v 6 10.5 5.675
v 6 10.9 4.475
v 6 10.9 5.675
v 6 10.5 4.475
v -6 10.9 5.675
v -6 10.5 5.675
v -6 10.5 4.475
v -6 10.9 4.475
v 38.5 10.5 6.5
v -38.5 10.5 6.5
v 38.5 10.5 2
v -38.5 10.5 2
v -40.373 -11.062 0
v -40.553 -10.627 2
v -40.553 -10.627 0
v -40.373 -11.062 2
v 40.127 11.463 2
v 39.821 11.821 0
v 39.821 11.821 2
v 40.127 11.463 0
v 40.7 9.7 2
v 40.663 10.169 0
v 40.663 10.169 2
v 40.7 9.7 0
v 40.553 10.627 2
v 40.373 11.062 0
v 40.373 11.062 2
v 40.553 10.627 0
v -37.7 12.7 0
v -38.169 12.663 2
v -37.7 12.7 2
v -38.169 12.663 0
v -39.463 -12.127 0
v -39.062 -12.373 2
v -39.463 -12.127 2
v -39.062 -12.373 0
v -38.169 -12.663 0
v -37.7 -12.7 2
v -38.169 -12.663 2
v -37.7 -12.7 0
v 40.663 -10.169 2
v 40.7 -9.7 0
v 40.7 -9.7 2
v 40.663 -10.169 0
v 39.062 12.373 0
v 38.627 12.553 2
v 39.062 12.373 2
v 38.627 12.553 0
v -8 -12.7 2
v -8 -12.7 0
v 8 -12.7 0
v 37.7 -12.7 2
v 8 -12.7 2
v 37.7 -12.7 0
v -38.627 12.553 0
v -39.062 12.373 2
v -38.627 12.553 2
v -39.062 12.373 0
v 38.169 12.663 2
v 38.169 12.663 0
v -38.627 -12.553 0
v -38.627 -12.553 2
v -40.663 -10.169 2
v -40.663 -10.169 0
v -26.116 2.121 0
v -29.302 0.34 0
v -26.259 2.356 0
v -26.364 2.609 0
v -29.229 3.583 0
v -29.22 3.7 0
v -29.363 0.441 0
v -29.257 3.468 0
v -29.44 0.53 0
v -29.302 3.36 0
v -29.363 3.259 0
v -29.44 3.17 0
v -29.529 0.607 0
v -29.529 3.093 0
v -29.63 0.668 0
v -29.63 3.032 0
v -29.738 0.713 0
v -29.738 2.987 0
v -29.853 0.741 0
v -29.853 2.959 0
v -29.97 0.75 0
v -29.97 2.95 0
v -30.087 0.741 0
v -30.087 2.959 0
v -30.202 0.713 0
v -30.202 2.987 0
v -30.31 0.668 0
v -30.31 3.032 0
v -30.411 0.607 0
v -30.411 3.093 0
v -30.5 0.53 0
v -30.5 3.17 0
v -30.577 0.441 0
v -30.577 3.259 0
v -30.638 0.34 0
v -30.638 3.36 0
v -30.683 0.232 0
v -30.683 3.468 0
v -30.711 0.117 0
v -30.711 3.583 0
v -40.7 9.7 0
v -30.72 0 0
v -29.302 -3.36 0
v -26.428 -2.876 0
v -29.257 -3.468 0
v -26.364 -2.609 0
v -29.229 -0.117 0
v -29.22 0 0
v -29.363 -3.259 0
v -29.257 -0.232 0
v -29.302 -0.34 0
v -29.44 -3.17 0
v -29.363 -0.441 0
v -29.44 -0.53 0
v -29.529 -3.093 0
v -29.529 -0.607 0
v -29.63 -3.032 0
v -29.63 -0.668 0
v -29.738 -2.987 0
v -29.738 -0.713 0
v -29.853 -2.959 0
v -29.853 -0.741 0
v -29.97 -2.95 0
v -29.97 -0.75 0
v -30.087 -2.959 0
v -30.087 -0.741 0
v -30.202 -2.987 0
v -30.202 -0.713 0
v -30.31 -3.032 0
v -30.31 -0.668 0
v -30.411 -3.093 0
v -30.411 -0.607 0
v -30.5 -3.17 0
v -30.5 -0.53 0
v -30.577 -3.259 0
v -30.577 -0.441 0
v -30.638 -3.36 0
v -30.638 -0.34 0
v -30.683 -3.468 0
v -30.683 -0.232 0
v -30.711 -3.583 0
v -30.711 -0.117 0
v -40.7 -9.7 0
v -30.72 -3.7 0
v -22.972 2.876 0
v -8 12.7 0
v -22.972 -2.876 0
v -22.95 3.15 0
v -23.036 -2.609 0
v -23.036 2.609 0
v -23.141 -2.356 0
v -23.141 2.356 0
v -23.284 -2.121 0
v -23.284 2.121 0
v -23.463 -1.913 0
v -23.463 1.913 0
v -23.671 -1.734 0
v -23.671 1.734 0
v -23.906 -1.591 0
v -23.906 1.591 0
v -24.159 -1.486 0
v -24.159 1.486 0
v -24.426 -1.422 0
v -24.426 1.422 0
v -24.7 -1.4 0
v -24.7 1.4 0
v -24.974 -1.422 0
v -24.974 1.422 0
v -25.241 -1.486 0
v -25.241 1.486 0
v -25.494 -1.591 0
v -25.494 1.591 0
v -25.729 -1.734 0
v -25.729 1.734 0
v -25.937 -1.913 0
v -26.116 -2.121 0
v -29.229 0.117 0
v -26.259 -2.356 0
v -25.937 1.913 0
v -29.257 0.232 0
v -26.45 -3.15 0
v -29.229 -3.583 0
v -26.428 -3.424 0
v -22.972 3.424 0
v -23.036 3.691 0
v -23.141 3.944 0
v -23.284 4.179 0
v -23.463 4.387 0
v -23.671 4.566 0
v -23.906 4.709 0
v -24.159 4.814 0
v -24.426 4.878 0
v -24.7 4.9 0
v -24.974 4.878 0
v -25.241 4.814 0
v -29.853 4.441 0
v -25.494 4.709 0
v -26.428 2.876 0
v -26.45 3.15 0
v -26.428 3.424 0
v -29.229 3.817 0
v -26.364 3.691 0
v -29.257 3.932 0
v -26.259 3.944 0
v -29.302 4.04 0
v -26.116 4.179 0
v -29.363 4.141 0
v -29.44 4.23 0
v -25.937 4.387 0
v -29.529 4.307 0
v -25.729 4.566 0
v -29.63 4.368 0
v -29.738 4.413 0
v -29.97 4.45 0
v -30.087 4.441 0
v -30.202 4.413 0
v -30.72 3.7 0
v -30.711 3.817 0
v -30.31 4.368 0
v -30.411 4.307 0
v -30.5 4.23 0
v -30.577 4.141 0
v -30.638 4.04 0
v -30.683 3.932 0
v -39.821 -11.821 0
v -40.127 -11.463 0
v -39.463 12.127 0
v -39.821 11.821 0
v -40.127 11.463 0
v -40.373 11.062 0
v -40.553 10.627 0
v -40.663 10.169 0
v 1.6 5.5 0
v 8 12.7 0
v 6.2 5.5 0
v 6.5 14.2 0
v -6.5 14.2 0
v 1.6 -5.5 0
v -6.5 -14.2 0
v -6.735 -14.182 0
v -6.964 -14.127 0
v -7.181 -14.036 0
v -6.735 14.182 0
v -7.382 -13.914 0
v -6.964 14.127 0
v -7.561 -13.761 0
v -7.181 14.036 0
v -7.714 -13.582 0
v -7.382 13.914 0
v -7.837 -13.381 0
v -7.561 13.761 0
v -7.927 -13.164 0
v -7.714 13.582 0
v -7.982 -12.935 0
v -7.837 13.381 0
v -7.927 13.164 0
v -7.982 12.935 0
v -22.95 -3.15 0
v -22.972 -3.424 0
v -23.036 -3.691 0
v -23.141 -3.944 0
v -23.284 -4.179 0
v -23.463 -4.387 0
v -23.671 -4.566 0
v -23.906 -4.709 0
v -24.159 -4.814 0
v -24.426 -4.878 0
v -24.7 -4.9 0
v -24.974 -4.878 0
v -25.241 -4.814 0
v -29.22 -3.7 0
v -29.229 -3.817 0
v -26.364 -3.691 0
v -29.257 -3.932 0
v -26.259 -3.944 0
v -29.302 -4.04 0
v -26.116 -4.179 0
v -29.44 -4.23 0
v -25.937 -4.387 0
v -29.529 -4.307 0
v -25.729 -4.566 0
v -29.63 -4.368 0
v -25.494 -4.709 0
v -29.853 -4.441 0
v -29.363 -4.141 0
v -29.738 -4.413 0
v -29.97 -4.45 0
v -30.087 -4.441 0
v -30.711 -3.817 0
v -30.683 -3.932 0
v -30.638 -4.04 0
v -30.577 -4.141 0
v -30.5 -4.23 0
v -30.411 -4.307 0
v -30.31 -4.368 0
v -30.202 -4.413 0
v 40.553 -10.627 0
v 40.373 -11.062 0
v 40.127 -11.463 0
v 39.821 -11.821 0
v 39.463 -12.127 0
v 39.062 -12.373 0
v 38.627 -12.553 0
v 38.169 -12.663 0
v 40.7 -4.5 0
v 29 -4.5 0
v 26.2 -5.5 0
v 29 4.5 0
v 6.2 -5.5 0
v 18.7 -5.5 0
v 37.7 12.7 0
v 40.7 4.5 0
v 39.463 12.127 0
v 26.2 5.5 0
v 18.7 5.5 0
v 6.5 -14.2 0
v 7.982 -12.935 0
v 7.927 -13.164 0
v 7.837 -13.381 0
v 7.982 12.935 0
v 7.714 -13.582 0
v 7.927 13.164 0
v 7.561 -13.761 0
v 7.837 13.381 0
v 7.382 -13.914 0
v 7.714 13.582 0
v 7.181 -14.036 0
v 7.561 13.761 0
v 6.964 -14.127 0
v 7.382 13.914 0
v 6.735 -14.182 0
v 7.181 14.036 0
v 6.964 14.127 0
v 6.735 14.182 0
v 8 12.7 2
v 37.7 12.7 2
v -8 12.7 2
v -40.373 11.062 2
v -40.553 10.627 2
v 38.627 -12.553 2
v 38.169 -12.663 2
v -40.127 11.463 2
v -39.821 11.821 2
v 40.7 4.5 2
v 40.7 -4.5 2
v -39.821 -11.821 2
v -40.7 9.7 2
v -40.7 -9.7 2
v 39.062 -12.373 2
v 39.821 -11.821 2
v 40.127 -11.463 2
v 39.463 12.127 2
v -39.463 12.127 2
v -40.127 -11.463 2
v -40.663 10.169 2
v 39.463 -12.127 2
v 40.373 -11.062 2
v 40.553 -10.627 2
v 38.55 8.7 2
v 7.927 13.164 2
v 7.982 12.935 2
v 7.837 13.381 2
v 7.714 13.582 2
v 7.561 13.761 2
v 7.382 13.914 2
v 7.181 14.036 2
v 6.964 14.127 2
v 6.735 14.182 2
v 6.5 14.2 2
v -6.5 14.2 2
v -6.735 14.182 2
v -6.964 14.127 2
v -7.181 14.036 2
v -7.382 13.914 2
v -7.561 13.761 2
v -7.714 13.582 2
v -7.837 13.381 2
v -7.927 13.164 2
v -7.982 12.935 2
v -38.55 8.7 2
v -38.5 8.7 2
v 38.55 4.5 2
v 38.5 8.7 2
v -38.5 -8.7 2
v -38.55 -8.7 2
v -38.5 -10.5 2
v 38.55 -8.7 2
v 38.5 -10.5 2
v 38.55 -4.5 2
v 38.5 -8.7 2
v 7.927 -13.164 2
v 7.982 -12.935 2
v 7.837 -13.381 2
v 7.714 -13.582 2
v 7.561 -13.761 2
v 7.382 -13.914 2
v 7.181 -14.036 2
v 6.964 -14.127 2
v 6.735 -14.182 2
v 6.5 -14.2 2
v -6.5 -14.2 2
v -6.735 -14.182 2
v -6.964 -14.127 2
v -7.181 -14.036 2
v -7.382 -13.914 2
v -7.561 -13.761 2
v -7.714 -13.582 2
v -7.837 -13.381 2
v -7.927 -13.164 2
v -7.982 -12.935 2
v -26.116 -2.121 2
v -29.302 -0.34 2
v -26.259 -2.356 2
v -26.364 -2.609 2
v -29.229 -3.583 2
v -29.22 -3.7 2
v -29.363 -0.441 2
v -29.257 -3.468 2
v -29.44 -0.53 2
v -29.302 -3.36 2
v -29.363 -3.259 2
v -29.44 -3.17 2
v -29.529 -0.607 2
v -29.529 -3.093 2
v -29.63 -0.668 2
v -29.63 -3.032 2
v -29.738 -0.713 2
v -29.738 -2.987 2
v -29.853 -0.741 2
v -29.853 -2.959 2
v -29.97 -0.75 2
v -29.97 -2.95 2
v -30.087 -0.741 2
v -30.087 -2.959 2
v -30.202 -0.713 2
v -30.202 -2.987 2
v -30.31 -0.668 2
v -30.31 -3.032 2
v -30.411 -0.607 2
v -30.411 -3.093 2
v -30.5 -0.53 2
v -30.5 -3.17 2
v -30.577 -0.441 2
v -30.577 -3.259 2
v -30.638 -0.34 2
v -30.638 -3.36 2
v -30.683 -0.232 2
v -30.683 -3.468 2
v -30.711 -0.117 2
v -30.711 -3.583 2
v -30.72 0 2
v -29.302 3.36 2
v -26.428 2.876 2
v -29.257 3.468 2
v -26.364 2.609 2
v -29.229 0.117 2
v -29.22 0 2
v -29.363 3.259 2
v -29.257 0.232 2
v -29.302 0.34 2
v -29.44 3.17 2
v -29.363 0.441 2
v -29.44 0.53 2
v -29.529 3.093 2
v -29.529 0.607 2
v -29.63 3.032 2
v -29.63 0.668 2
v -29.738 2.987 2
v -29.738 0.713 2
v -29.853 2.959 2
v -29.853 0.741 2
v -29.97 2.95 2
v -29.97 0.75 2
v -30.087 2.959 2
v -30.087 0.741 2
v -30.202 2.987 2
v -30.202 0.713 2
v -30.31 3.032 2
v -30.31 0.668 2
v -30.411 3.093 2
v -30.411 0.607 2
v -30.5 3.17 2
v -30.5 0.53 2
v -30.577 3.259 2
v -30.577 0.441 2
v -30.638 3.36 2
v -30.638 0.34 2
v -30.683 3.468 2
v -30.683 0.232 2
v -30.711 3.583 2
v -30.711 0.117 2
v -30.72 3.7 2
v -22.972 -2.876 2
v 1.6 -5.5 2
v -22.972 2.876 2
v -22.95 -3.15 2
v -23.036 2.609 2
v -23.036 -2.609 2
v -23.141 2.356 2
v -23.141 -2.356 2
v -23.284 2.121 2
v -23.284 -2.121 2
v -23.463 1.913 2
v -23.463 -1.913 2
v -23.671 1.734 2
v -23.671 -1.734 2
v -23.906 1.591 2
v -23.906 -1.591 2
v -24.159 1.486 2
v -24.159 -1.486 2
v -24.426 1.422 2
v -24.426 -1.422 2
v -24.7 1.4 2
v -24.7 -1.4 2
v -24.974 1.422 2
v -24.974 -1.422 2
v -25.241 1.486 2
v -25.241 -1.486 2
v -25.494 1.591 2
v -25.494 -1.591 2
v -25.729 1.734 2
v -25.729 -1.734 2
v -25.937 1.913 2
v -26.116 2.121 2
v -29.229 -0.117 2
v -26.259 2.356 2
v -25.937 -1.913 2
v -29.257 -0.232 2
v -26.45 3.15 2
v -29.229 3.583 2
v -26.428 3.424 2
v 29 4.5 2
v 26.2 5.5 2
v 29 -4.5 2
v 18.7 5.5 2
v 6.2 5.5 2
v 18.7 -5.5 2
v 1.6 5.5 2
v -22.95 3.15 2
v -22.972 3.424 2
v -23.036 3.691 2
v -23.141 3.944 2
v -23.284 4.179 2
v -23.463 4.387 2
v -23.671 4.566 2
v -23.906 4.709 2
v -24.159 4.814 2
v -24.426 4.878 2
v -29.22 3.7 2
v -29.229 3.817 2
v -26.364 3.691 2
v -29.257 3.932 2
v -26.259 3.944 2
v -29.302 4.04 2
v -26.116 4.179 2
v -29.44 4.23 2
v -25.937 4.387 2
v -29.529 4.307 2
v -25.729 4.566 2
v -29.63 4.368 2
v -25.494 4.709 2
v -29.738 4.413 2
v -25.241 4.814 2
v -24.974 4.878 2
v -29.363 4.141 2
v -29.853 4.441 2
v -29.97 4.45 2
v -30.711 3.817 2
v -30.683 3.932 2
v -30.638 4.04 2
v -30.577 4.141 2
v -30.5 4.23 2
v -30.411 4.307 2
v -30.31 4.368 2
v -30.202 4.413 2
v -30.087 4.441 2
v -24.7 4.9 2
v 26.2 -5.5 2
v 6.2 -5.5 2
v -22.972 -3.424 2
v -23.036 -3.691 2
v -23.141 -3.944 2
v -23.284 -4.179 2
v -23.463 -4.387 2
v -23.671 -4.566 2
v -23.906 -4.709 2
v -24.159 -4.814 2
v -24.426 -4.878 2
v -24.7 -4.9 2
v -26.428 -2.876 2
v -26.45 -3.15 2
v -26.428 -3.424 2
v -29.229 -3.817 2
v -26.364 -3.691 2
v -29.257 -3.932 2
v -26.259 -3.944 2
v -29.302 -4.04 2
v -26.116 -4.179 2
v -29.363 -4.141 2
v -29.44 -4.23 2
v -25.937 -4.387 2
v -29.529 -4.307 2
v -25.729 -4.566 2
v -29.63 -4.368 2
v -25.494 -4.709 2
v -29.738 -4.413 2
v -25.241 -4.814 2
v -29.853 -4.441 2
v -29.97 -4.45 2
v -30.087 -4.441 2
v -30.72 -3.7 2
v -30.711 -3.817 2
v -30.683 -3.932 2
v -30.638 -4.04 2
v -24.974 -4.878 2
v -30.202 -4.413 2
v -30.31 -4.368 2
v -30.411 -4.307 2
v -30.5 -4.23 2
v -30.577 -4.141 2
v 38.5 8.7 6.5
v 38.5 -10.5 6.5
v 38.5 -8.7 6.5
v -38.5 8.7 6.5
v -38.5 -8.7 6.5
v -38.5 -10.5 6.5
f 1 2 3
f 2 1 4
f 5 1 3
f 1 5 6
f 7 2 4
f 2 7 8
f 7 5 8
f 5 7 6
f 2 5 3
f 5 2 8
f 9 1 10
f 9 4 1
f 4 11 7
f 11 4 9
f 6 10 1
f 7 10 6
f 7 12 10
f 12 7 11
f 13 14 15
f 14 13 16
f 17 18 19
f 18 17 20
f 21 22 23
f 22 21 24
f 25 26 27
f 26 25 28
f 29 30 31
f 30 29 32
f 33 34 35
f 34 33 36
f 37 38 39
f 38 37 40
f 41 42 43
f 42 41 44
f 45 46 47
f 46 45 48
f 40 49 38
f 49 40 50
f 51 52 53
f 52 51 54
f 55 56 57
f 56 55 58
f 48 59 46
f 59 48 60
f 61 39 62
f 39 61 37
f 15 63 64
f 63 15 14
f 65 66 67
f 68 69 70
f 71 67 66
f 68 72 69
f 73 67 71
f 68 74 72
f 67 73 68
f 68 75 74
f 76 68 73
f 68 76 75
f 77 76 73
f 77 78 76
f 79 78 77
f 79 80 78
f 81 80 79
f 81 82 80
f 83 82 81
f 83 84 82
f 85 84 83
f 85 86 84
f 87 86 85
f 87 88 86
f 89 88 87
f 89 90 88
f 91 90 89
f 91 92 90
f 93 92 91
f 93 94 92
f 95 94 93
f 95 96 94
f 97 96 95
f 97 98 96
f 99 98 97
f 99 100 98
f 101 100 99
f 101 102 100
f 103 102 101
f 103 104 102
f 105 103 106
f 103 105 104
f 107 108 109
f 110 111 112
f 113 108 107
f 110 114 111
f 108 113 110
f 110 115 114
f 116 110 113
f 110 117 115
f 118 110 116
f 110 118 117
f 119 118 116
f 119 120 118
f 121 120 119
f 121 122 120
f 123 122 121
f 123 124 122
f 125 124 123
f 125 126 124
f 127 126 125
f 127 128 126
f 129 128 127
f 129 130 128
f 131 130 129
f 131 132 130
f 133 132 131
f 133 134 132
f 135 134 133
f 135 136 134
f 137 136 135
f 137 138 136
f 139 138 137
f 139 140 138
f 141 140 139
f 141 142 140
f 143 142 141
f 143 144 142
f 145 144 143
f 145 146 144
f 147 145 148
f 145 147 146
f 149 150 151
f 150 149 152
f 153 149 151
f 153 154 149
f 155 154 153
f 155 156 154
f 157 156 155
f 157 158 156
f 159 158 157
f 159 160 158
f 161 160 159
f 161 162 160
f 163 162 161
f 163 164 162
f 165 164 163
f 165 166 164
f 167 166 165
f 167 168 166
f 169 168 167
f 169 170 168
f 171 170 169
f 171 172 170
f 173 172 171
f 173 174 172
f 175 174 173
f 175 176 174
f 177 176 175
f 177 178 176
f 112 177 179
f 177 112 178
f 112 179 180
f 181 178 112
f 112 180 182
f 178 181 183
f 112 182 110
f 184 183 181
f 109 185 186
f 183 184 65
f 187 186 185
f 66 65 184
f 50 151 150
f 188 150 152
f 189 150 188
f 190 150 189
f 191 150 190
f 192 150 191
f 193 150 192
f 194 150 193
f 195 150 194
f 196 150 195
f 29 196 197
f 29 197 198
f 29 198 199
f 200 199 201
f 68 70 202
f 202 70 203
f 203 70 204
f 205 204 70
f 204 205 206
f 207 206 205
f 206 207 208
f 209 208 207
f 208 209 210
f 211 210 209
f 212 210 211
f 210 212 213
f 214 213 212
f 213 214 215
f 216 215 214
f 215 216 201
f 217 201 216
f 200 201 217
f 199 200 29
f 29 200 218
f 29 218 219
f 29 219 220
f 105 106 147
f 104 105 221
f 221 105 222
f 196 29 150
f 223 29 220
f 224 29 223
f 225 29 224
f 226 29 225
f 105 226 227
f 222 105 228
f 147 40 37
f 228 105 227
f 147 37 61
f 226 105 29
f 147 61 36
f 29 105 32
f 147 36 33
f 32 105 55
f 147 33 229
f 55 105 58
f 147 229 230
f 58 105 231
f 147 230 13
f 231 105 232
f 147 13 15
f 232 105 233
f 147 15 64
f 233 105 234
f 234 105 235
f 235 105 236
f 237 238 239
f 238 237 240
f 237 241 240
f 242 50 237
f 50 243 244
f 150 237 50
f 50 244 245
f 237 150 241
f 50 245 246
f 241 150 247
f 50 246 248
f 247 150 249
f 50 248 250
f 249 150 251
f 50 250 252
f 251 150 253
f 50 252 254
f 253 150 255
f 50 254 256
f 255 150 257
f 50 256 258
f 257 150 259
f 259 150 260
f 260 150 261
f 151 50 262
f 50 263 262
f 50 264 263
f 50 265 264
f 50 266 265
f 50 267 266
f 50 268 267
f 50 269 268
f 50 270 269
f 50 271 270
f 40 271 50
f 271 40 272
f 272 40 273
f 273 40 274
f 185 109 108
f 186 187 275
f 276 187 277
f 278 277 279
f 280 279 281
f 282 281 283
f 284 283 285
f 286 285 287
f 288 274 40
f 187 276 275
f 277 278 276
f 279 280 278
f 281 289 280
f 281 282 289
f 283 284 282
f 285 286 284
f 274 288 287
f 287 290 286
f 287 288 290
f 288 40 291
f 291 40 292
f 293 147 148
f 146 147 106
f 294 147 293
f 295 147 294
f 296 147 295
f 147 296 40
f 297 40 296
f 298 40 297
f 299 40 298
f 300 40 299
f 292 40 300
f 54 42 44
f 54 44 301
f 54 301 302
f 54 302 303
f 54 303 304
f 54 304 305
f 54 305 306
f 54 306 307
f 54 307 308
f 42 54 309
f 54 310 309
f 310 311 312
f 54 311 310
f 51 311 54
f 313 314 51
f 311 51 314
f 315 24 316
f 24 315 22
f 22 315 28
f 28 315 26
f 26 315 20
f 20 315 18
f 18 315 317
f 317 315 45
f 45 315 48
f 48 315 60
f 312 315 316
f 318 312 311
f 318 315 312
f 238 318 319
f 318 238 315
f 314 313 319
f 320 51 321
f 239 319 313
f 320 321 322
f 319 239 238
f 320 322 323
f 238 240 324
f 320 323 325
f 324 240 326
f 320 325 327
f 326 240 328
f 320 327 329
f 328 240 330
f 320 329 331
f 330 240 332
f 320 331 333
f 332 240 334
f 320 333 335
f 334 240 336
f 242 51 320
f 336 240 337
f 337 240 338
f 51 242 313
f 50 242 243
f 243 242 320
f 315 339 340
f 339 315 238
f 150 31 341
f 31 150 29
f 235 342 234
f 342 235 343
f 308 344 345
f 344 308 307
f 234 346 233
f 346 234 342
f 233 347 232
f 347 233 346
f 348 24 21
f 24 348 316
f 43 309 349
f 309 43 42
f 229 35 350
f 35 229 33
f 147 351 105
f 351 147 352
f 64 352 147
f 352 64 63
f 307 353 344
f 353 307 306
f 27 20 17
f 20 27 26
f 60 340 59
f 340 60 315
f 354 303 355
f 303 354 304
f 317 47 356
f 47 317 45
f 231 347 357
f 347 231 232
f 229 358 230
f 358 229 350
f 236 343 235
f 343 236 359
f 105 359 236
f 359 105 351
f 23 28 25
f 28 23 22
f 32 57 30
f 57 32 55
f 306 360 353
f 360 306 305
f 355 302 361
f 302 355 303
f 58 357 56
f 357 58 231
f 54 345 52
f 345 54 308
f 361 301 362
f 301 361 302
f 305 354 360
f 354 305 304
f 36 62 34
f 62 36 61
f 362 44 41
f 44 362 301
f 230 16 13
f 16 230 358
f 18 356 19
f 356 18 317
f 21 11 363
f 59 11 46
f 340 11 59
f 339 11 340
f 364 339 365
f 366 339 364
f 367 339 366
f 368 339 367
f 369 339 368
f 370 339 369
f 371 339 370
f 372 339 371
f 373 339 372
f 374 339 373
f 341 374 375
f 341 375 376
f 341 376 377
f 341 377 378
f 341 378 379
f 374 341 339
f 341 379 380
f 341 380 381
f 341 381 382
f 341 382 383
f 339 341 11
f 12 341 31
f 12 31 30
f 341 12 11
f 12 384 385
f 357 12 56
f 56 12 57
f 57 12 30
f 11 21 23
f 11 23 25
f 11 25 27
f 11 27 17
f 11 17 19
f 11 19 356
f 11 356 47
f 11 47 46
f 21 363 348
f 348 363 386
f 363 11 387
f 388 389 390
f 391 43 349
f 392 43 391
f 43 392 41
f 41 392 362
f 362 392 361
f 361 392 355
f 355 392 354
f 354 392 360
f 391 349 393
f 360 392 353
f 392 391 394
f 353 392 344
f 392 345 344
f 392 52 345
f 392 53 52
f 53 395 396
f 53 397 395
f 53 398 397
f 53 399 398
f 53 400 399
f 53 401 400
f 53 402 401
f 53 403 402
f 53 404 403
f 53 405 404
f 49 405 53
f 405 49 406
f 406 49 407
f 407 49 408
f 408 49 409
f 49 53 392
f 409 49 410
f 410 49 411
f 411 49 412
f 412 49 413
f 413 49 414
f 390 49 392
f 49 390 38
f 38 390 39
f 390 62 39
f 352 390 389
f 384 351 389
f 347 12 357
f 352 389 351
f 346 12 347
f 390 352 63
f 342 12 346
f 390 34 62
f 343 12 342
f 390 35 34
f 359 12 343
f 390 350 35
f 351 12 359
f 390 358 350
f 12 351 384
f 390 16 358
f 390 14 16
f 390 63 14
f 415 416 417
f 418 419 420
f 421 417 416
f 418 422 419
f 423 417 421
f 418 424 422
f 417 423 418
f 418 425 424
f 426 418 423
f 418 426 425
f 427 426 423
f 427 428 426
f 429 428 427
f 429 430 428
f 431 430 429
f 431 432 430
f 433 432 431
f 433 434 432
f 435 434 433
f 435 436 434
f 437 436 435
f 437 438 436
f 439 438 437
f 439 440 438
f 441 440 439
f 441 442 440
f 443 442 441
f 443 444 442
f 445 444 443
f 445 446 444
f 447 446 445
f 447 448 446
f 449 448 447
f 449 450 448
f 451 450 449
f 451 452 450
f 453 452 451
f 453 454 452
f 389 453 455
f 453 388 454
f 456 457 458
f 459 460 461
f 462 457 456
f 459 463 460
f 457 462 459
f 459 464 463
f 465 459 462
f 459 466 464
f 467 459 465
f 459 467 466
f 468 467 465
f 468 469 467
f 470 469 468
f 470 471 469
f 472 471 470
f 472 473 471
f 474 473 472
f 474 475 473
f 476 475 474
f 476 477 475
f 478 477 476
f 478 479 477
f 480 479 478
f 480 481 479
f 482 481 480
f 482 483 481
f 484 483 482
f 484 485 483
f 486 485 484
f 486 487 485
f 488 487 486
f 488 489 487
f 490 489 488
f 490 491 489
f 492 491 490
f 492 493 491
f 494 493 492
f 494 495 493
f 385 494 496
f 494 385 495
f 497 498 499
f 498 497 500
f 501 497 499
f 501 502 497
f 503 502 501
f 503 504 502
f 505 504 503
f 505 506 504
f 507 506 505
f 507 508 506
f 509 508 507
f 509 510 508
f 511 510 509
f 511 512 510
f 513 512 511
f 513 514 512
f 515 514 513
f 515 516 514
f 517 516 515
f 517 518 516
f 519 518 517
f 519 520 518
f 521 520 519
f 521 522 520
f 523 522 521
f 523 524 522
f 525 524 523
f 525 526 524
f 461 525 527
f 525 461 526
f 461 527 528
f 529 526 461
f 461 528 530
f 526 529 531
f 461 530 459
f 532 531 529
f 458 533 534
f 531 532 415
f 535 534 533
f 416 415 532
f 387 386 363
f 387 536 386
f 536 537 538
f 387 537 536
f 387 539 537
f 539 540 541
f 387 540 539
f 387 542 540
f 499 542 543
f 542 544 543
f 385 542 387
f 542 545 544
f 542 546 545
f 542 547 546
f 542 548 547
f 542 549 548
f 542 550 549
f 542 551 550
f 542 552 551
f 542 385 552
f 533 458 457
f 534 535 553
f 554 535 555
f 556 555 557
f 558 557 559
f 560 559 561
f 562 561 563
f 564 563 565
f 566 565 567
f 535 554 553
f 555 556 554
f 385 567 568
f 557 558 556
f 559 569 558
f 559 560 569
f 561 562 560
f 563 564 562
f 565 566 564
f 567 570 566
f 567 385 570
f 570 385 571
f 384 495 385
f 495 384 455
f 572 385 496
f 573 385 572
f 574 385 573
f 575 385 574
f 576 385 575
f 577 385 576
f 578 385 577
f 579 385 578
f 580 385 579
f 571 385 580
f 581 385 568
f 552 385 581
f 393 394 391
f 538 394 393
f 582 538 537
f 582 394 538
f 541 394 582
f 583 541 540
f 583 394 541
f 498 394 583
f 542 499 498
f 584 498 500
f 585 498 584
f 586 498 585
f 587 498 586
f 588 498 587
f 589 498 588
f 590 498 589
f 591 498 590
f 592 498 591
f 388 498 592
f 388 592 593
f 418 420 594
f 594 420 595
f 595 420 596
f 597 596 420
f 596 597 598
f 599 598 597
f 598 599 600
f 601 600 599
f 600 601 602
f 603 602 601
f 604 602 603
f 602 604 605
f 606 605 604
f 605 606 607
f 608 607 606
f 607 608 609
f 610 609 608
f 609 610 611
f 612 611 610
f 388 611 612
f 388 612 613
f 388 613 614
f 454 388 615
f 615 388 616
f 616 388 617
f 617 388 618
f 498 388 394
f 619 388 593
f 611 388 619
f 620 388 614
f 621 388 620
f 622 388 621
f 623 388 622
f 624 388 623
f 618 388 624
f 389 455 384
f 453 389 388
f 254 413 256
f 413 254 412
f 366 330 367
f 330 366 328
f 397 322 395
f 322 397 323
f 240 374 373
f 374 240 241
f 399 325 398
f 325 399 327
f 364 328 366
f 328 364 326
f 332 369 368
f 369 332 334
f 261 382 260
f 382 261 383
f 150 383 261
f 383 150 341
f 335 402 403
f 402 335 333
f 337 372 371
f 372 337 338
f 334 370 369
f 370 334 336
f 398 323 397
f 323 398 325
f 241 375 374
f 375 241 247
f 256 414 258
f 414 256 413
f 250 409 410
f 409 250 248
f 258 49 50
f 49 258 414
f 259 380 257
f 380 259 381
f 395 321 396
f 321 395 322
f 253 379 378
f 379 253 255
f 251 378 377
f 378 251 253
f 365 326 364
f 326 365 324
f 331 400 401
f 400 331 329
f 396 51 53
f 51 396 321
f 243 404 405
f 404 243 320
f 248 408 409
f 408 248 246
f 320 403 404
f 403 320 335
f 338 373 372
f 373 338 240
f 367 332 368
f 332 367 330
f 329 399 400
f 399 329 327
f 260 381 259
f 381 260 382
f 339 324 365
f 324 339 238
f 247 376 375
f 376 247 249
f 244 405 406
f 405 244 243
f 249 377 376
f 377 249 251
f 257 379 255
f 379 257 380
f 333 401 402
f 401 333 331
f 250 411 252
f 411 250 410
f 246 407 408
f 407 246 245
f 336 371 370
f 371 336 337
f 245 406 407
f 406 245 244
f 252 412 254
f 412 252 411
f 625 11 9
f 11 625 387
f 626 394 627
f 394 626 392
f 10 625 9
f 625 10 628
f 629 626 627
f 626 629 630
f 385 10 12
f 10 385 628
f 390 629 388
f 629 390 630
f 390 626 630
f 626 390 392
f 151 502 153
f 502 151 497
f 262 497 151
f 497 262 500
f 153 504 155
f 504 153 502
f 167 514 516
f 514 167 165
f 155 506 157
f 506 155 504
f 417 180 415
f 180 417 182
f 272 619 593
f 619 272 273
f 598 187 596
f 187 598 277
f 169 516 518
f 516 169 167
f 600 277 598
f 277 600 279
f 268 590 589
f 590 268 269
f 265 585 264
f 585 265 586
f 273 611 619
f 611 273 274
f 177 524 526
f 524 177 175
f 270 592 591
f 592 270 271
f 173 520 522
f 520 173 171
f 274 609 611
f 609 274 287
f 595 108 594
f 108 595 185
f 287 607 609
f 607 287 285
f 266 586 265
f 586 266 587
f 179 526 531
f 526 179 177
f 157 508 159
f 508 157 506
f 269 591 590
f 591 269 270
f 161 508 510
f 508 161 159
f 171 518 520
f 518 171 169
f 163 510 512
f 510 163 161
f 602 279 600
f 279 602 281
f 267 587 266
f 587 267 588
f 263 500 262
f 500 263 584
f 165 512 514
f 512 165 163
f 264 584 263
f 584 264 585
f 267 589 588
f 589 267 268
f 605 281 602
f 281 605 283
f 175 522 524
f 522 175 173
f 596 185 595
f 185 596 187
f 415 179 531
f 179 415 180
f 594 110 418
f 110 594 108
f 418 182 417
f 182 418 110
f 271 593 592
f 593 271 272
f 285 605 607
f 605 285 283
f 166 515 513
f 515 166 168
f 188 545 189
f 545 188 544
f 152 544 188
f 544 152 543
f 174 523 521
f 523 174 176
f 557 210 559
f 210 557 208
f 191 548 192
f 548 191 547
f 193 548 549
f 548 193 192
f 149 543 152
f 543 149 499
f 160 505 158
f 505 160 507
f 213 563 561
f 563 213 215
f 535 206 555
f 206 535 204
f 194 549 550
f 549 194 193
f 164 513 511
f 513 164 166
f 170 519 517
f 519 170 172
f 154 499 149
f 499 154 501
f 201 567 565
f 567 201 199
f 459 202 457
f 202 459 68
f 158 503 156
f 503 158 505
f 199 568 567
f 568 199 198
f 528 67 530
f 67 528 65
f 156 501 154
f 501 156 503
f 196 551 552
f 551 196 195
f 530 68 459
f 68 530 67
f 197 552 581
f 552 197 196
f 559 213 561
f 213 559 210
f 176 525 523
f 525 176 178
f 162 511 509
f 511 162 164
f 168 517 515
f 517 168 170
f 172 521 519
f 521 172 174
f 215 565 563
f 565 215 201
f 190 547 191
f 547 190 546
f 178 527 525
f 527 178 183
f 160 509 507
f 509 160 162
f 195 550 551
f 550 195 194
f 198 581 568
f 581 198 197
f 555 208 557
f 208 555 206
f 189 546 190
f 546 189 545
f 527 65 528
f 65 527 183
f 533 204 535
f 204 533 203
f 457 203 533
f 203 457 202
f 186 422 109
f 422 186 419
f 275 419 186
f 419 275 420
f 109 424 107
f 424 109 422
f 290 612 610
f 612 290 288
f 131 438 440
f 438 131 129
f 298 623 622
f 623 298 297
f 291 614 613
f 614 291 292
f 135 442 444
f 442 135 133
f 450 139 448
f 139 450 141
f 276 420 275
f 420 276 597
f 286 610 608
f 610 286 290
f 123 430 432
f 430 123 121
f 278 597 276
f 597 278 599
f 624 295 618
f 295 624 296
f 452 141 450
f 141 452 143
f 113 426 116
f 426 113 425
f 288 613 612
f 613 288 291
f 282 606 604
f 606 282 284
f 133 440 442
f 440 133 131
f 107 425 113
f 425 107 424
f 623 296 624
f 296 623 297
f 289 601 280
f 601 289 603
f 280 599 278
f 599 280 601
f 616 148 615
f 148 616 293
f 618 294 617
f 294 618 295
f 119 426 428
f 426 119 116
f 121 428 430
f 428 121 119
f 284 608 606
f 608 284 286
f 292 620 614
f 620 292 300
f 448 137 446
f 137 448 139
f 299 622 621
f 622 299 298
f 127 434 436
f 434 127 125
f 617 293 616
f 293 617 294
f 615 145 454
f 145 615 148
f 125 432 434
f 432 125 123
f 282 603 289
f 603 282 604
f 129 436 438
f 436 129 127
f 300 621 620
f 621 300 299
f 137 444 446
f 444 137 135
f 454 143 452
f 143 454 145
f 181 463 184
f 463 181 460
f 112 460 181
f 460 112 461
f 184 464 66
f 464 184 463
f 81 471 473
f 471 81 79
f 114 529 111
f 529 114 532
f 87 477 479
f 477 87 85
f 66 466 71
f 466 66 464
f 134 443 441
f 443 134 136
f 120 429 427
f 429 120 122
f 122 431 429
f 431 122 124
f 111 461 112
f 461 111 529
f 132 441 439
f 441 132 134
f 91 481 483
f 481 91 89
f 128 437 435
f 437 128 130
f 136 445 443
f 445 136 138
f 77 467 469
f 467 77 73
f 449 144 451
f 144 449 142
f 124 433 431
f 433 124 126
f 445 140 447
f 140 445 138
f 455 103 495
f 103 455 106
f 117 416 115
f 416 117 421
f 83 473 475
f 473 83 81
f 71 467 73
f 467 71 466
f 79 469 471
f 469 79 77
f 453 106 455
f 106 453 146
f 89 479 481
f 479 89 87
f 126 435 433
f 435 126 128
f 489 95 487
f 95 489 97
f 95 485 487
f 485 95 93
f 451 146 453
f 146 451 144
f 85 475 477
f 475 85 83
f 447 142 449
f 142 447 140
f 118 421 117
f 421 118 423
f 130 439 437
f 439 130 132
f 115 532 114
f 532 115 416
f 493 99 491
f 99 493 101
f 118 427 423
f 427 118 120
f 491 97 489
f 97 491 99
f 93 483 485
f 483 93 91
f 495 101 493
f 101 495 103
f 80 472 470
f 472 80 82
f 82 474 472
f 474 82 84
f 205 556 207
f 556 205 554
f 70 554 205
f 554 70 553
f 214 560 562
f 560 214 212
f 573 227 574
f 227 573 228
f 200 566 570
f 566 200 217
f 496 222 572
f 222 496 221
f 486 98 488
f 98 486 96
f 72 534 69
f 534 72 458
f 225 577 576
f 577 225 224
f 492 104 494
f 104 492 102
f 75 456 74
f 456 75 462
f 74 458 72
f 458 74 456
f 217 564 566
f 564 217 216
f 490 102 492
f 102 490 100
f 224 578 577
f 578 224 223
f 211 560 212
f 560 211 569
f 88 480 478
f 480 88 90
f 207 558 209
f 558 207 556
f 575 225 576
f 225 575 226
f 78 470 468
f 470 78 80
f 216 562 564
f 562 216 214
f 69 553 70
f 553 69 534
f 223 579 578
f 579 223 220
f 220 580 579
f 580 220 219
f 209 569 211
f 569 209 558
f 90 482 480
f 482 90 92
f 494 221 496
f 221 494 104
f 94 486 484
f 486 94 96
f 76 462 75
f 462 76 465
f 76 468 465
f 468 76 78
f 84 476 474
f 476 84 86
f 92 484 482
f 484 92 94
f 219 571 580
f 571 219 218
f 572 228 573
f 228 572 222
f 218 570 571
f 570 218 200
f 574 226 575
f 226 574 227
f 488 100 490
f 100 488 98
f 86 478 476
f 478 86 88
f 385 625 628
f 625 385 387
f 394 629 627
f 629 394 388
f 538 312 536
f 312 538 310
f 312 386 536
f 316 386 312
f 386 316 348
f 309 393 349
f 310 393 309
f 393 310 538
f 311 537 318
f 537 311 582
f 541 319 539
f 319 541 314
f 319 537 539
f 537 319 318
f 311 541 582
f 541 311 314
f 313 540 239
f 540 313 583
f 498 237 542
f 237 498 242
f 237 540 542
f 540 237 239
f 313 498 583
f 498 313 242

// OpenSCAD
// =====================================================================
// Pimoroni Pico Plus 2 W XL - Snap-In Lid with Modular Cutouts
// Features: QW/ST+DEBUG, SP/CE, BOOT/PWR buttons, and 3 Status LEDs
// =====================================================================

$fn = 40;

// =====================================================================
// --- USER TWEAK CONSTANTS: CONNECTOR & BUTTON PUNCHES ---
// =====================================================================

// --- 1. Boot & Power/Reset Button Holes (Referenced from USB-C End) ---
btn_enable          = true;    // Set to false to disable both button holes
btn_dist_from_usbc  = 14.0;    // [FIXED] Caliper-locked distance from USB-C PCB edge inward along X
btn_spacing_y       = 6.3;     // Centre-to-centre distance between the two buttons across Y
btn_radius          = 1.75;    // Radius of button access holes (3.5 mm diameter)

// --- 2. QW/ST + DEBUG Combined Punch (From JST End) ---
qwst_debug_enable   = true;
qwst_debug_dist     = 12.5;    // X start (13.0 mm - 0.5 mm clearance)
qwst_debug_len      = 7.5;     // X length (covers 13.0 to 19.5 mm + clearance)
qwst_debug_wid      = 11.0;    // Y width (10.03 mm body + ~1.0 mm clearance)
qwst_debug_offset_y = 0.0;     // Centered on board midline

// --- 3. SP/CE Connector Punch (From JST End) ---
spce_enable         = true;
spce_dist           = 32.5;    // X start (33.0 mm - 0.5 mm clearance)
spce_len            = 4.6;     // X length (covers 33.00 to 36.57 mm + clearance)
spce_wid            = 11.0;    // Y width (10.03 mm body + ~1.0 mm clearance)
spce_offset_y       = 0.0;     // Centered on board midline

// --- 4. [NEW INCLUSION] 3x Status LED Light Holes (Referenced from USB-C End) ---
led_enable          = true;    // Set to false to disable LED holes
led_dist_from_usbc  = 8.73;    // Distance from USB-C PCB edge inward along X
led_pitch_y         = 3.70;    // Pitch between adjacent LED centres across Y (total span 7.4 mm)
led_radius          = 0.75;    // Radius of LED light holes (1.5 mm diameter)


// =====================================================================
// --- BASE & ENCLOSURE GEOMETRY (Matching Case) ---
// =====================================================================
pcb_len        = 77.0;
pcb_wid        = 21.0;
pcb_thick      = 1.45;
pcb_clearance  = 0.40;   // Cavity: 77.4 x 21.4 mm
wall_thick     = 2.0;
outer_radius   = 3.0;
board_headroom = 4.5;    // Inside depth from case rim down to PCB surface

// --- Lid & Snap Parameters ---
lid_top_thick  = 2.0;    // Thickness of outer top plate
lid_play       = 0.20;   // Sliding clearance per side
clamp_rail_w   = 1.80;   // Down-pressure rail over PCB edges

snap_bead_h    = 0.40;   // Snap bead protrusion
snap_bead_len  = 12.0;   // Snap bead length

pry_overhang   = 1.50;   // Fingernail tab overhang past outer wall
pry_tab_len    = 16.0;   // Fingernail tab length along X

jst_window_w   = 9.0;    // JST-PH connector cutout width (Y)
jst_window_l   = 9.5;    // JST-PH connector cutout length (X)
usbc_hood_drop = 1.0;    // USB-C collar drop clearance

// --- Derived Coordinates ---
cavity_x   = pcb_len + pcb_clearance;
cavity_y   = pcb_wid + pcb_clearance;
outer_x    = cavity_x + (2 * wall_thick);
outer_y    = cavity_y + (2 * wall_thick);

plug_x     = cavity_x - (2 * lid_play);
plug_y     = cavity_y - (2 * lid_play);

// Physical reference edges of the PCB inside the cavity
pcb_jst_edge_x  =  cavity_x / 2; // +X end
pcb_usbc_edge_x = -cavity_x / 2; // -X end

// --- Helper: 2D Rounded Rectangle ---
module rounded_rect(w, l, r) {
    hull() {
        for (dx = [-w/2 + r, w/2 - r]) {
            for (dy = [-l/2 + r, l/2 - r]) {
                translate([dx, dy]) circle(r = r);
            }
        }
    }
}

// =====================================================================
// --- MODULAR CUTOUT ROUTINES ---
// =====================================================================

// Generic rectangular punch measured from JST edge inward (-X)
module punch_window_from_jst(from_jst_edge, length_x, width_y, offset_y) {
    punch_center_x = pcb_jst_edge_x - from_jst_edge - (length_x / 2);
    translate([punch_center_x, offset_y, -1.0]) {
        cube([length_x, width_y, lid_top_thick + board_headroom + 2.0], center = true);
    }
}

module punch_qwst_debug() {
    if (qwst_debug_enable) {
        punch_window_from_jst(qwst_debug_dist, qwst_debug_len, qwst_debug_wid, qwst_debug_offset_y);
    }
}

module punch_spce() {
    if (spce_enable) {
        punch_window_from_jst(spce_dist, spce_len, spce_wid, spce_offset_y);
    }
}

// Dual round hole punch for Boot & Power buttons measured from USB-C edge inward (+X)
module punch_boot_pwr_buttons() {
    if (btn_enable) {
        btn_center_x = pcb_usbc_edge_x + btn_dist_from_usbc;
        
        for (side = [-1, 1]) {
            translate([btn_center_x, side * (btn_spacing_y / 2), -1.0]) {
                cylinder(r = btn_radius, h = lid_top_thick + board_headroom + 2.0);
            }
        }
    }
}

// [NEW INCLUSION] Trio of Status LED access holes measured from USB-C edge inward (+X)
module punch_status_leds() {
    if (led_enable) {
        led_center_x = pcb_usbc_edge_x + led_dist_from_usbc;
        
        for (pos = [-1, 0, 1]) {
            translate([led_center_x, pos * led_pitch_y, -1.0]) {
                cylinder(r = led_radius, h = lid_top_thick + board_headroom + 2.0);
            }
        }
    }
}

// =====================================================================
// --- MAIN LID ASSEMBLY ---
// =====================================================================
module pico_plus_2w_xl_lid() {
    difference() {
        union() {
            // 1. Top Cover Plate
            linear_extrude(height = lid_top_thick) {
                rounded_rect(outer_x, outer_y, outer_radius);
            }

            // 2. Dual Fingernail Pry Tabs (protrude on both long Y sides)
            linear_extrude(height = lid_top_thick) {
                hull() {
                    rounded_rect(pry_tab_len, outer_y + (2 * pry_overhang), 1.5);
                }
            }

            // 3. Inner Plug Body (enters the case cavity)
            translate([-plug_x/2, -plug_y/2, lid_top_thick]) {
                cube([plug_x, plug_y, board_headroom]);
            }

            // 4. Snap-fit Detent Beads
            for (side = [-1, 1]) {
                translate([
                    -snap_bead_len / 2, 
                    side * (plug_y / 2 + (side > 0 ? 0 : -snap_bead_h)), 
                    lid_top_thick + (board_headroom * 0.55)
                ]) {
                    cube([snap_bead_len, snap_bead_h, 1.2]);
                }
            }
        }

        // --- SUBTRACTIONS ---

        // A. Central Underside Hollowing (leaves side clamping rails)
        translate([
            -(plug_x + 0.1)/2, 
            -(plug_y - 2 * clamp_rail_w)/2, 
            lid_top_thick
        ]) {
            cube([plug_x + 0.1, plug_y - 2 * clamp_rail_w, board_headroom + 0.1]);
        }

        // B. End JST-PH Connector Window (+X end)
        translate([
            (plug_x / 2) - jst_window_l, 
            -jst_window_w / 2, 
            -0.1
        ]) {
            cube([jst_window_l + wall_thick + 1.0, jst_window_w, lid_top_thick + board_headroom + 0.2]);
        }

        // C. USB-C Overmold Hood Relief (-X end)
        translate([
            -(plug_x / 2 + wall_thick + 0.5), 
            -11.0 / 2, 
            lid_top_thick + board_headroom - usbc_hood_drop
        ]) {
            cube([wall_thick + 1.0, 11.0, usbc_hood_drop + 0.1]);
        }

        // D. Modular Connector Punches
        punch_qwst_debug();
        punch_spce();

        // E. Modular Button Access Holes
        punch_boot_pwr_buttons();

        // F. [NEW INCLUSION] Modular Status LED Access Holes
        punch_status_leds();
    }
}

pico_plus_2w_xl_lid();
